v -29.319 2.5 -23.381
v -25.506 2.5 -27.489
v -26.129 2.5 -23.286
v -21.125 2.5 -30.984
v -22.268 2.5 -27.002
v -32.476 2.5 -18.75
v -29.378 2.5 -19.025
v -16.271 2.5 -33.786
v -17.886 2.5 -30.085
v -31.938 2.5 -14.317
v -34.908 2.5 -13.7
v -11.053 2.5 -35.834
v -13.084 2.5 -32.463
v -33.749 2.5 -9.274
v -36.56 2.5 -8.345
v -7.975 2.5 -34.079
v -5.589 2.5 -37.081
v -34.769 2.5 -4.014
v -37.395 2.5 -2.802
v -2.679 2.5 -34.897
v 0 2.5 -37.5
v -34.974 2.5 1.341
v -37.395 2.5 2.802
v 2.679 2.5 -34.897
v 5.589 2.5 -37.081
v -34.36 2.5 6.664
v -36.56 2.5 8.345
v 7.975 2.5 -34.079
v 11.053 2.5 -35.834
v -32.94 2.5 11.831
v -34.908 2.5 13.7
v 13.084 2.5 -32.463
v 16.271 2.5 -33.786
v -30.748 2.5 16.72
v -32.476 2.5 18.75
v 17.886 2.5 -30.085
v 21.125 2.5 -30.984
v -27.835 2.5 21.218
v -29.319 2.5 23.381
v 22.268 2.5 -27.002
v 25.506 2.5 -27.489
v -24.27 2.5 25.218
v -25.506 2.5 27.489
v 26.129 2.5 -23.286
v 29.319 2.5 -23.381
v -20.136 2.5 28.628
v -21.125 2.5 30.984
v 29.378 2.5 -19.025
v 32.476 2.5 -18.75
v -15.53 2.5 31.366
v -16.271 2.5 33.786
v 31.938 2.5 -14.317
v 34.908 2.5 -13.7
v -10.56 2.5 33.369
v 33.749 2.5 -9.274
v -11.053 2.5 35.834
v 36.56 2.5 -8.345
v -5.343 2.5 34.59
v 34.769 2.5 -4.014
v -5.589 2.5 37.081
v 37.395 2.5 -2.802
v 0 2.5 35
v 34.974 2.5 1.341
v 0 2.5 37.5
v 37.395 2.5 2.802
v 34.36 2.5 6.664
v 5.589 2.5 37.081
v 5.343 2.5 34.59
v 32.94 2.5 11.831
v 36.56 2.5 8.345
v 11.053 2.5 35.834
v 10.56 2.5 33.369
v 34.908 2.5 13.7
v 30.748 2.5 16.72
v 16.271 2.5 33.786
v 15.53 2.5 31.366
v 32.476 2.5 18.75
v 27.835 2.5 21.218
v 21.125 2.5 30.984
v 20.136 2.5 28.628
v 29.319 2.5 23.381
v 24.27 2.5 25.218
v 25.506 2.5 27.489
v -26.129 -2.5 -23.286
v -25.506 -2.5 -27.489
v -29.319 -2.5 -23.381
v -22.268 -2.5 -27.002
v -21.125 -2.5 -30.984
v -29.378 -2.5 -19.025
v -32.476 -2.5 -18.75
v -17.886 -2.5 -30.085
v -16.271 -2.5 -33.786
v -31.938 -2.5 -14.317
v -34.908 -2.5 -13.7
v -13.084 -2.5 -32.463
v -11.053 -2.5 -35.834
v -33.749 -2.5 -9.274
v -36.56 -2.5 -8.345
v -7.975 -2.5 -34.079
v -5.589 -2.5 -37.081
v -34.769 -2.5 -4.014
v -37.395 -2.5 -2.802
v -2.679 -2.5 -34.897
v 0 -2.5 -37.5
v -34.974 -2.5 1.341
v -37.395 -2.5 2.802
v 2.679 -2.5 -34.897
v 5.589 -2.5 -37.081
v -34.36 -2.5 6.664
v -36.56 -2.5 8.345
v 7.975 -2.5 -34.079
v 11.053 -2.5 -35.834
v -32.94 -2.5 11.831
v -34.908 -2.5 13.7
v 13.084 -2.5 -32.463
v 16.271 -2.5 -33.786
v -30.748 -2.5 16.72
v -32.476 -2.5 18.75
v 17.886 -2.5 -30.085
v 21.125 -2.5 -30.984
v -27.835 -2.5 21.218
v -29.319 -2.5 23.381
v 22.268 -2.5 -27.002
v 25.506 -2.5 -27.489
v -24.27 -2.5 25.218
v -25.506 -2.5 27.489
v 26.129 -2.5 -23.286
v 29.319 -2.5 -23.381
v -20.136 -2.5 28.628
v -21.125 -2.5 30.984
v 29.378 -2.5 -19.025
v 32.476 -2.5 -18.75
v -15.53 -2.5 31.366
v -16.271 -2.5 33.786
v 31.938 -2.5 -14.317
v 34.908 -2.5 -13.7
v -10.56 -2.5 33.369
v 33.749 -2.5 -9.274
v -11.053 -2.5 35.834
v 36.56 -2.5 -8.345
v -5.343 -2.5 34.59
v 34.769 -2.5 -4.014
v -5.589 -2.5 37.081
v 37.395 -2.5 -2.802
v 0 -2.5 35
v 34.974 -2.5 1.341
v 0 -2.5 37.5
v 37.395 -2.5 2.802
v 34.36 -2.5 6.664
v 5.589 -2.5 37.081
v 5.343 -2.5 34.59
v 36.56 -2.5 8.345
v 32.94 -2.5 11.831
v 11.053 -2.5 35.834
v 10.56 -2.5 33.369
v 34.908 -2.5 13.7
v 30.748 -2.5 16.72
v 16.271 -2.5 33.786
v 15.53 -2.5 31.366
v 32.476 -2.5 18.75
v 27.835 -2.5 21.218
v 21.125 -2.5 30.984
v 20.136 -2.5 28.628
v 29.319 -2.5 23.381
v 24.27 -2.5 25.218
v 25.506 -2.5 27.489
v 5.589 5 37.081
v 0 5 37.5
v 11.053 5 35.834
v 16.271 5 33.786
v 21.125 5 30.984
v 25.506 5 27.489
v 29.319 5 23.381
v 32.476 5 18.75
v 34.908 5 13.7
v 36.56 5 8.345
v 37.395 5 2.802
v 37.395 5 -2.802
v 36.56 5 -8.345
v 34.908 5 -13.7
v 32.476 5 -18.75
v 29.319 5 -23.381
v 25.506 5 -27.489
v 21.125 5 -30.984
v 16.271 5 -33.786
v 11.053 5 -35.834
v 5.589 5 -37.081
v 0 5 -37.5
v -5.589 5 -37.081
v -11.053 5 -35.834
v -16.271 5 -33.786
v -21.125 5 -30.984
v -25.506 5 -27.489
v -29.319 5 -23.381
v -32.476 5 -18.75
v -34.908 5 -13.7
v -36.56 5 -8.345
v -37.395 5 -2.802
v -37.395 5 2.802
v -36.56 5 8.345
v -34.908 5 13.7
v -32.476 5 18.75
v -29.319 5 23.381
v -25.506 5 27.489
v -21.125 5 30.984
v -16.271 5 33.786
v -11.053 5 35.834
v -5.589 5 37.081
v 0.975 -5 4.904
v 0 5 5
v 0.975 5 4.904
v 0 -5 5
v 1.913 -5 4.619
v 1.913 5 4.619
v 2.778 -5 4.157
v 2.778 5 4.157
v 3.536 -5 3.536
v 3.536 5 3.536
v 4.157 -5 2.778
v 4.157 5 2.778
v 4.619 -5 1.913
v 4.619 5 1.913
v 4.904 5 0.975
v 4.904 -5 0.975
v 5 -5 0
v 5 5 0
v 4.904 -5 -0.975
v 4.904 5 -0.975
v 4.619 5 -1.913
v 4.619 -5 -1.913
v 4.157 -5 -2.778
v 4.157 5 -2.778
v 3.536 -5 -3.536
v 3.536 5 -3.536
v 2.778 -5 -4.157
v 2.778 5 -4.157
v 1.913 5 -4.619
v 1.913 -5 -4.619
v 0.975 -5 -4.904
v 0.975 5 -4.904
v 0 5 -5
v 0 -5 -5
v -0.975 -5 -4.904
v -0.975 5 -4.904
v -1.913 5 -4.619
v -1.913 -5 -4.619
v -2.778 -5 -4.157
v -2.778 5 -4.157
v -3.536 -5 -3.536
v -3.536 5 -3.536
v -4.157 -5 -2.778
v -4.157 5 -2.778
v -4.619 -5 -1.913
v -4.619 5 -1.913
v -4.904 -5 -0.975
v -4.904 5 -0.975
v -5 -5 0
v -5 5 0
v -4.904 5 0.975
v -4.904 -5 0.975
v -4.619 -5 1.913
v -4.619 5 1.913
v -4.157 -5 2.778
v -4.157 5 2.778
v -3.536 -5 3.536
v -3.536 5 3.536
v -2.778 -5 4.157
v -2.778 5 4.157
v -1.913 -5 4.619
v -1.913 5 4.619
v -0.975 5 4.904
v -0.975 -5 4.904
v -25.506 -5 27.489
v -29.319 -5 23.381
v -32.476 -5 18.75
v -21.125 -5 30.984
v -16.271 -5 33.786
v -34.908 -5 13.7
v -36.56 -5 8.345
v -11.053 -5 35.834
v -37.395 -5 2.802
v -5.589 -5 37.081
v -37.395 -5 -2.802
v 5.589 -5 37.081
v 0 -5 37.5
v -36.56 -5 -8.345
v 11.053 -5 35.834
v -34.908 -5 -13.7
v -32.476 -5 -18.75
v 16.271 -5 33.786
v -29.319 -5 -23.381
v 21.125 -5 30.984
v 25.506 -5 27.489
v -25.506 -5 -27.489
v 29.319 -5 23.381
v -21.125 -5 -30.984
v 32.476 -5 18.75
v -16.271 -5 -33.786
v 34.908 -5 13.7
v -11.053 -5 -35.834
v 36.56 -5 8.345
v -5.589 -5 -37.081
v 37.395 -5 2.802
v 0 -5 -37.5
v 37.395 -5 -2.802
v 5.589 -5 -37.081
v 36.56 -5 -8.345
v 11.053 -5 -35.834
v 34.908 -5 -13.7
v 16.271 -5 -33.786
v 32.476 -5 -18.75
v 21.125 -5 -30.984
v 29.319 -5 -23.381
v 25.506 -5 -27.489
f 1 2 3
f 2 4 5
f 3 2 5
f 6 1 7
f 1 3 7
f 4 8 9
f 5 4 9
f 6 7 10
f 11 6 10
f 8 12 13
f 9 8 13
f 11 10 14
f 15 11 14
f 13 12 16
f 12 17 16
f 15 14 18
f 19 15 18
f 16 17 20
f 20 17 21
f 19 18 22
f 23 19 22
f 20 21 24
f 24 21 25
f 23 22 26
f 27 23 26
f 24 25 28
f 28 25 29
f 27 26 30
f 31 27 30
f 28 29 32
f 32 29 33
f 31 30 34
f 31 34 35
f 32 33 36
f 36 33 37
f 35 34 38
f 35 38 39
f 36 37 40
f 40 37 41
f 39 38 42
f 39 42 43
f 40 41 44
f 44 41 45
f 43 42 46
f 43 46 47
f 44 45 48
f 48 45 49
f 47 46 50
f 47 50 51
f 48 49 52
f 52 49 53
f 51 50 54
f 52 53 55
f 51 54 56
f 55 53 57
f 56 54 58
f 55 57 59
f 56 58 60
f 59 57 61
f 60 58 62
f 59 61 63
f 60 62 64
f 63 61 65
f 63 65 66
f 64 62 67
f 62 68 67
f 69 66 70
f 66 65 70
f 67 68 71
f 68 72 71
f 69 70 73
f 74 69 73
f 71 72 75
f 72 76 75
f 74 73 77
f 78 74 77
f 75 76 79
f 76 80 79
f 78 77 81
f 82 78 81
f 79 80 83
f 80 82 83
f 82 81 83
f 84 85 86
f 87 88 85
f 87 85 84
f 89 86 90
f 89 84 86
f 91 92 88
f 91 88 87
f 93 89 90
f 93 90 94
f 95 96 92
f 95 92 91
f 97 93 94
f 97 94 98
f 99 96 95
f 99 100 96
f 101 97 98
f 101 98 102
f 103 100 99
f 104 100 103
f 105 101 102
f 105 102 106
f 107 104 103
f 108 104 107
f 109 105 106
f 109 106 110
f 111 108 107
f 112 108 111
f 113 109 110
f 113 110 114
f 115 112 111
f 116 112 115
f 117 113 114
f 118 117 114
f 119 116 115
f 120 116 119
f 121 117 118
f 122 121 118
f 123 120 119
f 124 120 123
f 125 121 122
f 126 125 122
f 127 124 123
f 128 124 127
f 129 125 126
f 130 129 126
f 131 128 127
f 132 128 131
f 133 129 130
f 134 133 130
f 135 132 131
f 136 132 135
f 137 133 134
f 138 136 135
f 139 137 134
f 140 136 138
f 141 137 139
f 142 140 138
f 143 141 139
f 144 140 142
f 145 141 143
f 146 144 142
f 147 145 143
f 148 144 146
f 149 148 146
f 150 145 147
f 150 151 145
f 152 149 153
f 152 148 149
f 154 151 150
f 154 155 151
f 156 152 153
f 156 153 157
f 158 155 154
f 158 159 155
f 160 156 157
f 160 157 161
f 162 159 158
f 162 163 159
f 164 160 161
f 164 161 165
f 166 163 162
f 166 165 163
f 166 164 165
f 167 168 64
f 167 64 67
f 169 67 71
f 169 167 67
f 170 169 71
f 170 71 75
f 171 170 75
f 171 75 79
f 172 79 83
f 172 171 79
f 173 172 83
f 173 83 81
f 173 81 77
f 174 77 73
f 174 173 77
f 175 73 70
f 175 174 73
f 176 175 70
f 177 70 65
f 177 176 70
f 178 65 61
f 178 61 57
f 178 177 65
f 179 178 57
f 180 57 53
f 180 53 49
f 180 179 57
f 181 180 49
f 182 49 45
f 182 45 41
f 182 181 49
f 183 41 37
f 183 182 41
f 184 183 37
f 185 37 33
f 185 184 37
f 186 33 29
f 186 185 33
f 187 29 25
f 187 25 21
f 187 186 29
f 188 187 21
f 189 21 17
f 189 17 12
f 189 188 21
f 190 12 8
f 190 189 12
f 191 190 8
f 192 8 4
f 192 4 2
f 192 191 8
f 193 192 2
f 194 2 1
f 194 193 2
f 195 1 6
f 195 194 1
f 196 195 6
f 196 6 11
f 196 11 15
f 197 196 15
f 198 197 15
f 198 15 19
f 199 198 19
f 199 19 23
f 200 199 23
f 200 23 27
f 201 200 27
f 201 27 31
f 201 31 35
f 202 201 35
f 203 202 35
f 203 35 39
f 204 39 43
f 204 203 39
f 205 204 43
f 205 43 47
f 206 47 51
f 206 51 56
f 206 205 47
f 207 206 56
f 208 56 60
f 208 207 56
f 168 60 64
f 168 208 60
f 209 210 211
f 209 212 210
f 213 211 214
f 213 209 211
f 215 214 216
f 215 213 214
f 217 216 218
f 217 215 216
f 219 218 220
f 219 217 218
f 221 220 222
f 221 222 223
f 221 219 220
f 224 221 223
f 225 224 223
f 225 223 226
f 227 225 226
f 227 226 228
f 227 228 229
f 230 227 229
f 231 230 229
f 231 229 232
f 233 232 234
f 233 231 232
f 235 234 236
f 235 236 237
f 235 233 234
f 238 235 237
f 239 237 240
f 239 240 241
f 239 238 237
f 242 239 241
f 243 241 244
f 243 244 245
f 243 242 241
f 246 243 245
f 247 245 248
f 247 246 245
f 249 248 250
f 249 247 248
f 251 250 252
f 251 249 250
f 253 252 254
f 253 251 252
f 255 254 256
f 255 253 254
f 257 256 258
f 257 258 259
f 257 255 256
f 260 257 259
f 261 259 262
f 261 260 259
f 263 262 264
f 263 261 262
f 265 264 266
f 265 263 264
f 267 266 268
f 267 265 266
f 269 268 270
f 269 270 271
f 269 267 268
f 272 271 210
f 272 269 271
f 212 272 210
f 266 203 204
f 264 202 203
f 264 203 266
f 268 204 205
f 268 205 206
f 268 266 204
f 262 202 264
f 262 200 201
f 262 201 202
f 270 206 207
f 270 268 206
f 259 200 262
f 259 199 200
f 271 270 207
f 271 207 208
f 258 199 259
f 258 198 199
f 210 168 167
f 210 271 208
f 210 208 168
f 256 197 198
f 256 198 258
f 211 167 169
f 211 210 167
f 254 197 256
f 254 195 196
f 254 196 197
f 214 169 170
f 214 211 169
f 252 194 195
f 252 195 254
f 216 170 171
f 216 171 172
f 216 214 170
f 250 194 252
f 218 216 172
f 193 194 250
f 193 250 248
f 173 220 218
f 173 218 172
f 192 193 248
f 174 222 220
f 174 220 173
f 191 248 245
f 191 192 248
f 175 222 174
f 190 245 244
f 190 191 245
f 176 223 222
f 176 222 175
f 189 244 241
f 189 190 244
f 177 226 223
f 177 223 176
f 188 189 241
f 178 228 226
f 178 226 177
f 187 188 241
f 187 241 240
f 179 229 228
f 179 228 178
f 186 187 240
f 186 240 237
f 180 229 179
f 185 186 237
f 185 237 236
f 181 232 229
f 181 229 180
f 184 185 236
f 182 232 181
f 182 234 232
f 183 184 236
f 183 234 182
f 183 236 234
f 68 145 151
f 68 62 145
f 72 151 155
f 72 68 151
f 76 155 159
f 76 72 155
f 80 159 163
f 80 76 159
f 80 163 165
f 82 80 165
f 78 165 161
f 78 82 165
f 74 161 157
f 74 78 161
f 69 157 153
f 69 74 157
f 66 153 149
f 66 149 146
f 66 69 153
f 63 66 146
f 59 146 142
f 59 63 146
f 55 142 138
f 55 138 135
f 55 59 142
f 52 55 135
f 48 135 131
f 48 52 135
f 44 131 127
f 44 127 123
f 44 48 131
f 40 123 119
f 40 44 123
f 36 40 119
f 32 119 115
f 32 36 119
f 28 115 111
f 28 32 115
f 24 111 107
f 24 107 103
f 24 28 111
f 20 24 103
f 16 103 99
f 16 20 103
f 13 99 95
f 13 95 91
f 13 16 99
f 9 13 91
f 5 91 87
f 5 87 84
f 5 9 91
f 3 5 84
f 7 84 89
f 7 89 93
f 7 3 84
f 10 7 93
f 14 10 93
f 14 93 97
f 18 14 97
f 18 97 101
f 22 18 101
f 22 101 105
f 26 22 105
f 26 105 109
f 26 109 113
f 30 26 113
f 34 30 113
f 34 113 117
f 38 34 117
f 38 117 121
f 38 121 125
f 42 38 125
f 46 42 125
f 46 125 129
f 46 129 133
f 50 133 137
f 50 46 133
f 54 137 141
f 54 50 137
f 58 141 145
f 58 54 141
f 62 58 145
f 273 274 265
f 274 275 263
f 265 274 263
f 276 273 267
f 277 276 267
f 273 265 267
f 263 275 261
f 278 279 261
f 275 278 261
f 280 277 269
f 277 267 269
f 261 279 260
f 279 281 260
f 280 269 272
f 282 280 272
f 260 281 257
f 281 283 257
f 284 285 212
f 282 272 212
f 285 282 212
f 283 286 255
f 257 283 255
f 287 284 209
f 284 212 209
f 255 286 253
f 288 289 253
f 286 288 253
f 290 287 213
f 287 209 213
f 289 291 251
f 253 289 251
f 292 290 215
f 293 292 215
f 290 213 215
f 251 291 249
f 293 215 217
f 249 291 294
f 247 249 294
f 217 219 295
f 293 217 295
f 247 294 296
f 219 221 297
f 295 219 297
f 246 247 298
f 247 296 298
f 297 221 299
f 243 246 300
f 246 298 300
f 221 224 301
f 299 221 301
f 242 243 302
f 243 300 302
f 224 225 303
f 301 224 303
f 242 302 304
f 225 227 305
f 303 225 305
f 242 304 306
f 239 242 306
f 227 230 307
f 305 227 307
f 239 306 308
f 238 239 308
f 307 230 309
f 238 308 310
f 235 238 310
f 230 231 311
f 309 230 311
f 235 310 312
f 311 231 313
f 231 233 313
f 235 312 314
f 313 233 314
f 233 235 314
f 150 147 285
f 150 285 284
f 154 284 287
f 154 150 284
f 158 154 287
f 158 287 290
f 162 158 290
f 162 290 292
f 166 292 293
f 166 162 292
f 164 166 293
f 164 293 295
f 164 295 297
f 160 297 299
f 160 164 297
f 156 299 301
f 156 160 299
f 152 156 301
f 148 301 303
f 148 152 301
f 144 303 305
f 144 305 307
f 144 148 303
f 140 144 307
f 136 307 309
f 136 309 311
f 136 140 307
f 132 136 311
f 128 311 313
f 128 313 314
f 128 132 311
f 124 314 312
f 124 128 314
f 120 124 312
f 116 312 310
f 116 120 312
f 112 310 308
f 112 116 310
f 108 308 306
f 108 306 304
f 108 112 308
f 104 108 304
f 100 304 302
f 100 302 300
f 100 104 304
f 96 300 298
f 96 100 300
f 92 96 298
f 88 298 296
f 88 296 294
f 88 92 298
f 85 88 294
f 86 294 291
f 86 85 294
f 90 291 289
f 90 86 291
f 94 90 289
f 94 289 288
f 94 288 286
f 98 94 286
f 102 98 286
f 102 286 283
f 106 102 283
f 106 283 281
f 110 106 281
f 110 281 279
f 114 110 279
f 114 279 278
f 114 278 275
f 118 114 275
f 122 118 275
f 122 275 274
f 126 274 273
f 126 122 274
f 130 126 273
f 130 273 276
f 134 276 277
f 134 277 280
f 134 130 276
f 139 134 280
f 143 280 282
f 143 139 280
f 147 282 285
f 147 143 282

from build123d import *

# Parameters (mm, degrees)
SKETCH1_R           = 35
SKETCH1_R_2         = 7.5
BOSS_EXTRUDE2_DEPTH = 2.5
BOSS_EXTRUDE3_START = 5
SKETCH1_10_R        = 37.5
SKETCH1_10_R_2      = 35
SKETCH1_10_R_3      = 7.5
BOSS_EXTRUDE3_DEPTH = 2.5
BOSS_EXTRUDE4_START = -2.5
SKETCH1_11_R        = 37.5
SKETCH1_11_R_2      = 35
BOSS_EXTRUDE4_DEPTH = 2.5
BOSS_EXTRUDE6_START = -5
SKETCH1_15_R        = 35
SKETCH1_15_R_2      = 7.5
BOSS_EXTRUDE6_DEPTH = 2.5
SKETCH1_16_R        = 7.5
SKETCH1_16_R_2      = 5
BOSS_EXTRUDE7_DEPTH = 5


with BuildPart() as part:
    # Sketch1 → Boss-Extrude2 (new, symmetric)
    with BuildSketch(Plane(origin=(0, 0, 0), x_dir=(1, 0, 0), z_dir=(0, 1, 0))):
        with Locations(Location((0, 0, 0), (0, 0, 270))):
            Circle(SKETCH1_R)
        with Locations(Location((0, 0, 0), (0, 0, 270))):
            Circle(SKETCH1_R_2, mode=Mode.SUBTRACT)
    extrude(amount=BOSS_EXTRUDE2_DEPTH, both=True)

    # Sketch1<10> → Boss-Extrude3 (add)
    # profile 1 of 2: a face of its own
    with BuildSketch(Plane(origin=(0, 0, 0), x_dir=(1, 0, 0), z_dir=(0, 1, 0)).offset(BOSS_EXTRUDE3_START)):
        with Locations(Location((0, 0, 0), (0, 0, 270))):
            Circle(SKETCH1_10_R)
        with Locations(Location((0, 0, 0), (0, 0, 270))):
            Circle(SKETCH1_10_R_2, mode=Mode.SUBTRACT)
    # profile 2 of 2: a face of its own
    with BuildSketch(Plane(origin=(0, 0, 0), x_dir=(1, 0, 0), z_dir=(0, 1, 0)).offset(BOSS_EXTRUDE3_START)):
        with Locations(Location((0, 0, 0), (0, 0, 270))):
            Circle(SKETCH1_10_R_2)
        with Locations(Location((0, 0, 0), (0, 0, 270))):
            Circle(SKETCH1_10_R_3, mode=Mode.SUBTRACT)
    extrude(amount=-BOSS_EXTRUDE3_DEPTH)



with BuildPart() as body_2:
    # Sketch1<11> → Boss-Extrude4 (new body)
    with BuildSketch(Plane(origin=(0, 0, 0), x_dir=(1, 0, 0), z_dir=(0, 1, 0)).offset(BOSS_EXTRUDE4_START)):
        with Locations(Location((0, 0, 0), (0, 0, 270))):
            Circle(SKETCH1_11_R)
        with Locations(Location((0, 0, 0), (0, 0, 270))):
            Circle(SKETCH1_11_R_2, mode=Mode.SUBTRACT)
    extrude(amount=-BOSS_EXTRUDE4_DEPTH)


with BuildPart() as part_1:
    add(part.part)

    add(body_2.part)  # Boss-Extrude6 merges body 2
    # Sketch1<15> → Boss-Extrude6 (add)
    with BuildSketch(Plane(origin=(0, 0, 0), x_dir=(1, 0, 0), z_dir=(0, 1, 0)).offset(BOSS_EXTRUDE6_START)):
        with Locations(Location((0, 0, 0), (0, 0, 270))):
            Circle(SKETCH1_15_R)
        with Locations(Location((0, 0, 0), (0, 0, 270))):
            Circle(SKETCH1_15_R_2, mode=Mode.SUBTRACT)
    extrude(amount=BOSS_EXTRUDE6_DEPTH)

    # Sketch1<16> → Boss-Extrude7 (add, symmetric)
    with BuildSketch(Plane(origin=(0, 0, 0), x_dir=(1, 0, 0), z_dir=(0, 1, 0))):
        Circle(SKETCH1_16_R)
        with Locations(Location((0, 0, 0), (0, 0, 270))):
            Circle(SKETCH1_16_R_2, mode=Mode.SUBTRACT)
    extrude(amount=BOSS_EXTRUDE7_DEPTH, both=True)


solid = part_1.part
